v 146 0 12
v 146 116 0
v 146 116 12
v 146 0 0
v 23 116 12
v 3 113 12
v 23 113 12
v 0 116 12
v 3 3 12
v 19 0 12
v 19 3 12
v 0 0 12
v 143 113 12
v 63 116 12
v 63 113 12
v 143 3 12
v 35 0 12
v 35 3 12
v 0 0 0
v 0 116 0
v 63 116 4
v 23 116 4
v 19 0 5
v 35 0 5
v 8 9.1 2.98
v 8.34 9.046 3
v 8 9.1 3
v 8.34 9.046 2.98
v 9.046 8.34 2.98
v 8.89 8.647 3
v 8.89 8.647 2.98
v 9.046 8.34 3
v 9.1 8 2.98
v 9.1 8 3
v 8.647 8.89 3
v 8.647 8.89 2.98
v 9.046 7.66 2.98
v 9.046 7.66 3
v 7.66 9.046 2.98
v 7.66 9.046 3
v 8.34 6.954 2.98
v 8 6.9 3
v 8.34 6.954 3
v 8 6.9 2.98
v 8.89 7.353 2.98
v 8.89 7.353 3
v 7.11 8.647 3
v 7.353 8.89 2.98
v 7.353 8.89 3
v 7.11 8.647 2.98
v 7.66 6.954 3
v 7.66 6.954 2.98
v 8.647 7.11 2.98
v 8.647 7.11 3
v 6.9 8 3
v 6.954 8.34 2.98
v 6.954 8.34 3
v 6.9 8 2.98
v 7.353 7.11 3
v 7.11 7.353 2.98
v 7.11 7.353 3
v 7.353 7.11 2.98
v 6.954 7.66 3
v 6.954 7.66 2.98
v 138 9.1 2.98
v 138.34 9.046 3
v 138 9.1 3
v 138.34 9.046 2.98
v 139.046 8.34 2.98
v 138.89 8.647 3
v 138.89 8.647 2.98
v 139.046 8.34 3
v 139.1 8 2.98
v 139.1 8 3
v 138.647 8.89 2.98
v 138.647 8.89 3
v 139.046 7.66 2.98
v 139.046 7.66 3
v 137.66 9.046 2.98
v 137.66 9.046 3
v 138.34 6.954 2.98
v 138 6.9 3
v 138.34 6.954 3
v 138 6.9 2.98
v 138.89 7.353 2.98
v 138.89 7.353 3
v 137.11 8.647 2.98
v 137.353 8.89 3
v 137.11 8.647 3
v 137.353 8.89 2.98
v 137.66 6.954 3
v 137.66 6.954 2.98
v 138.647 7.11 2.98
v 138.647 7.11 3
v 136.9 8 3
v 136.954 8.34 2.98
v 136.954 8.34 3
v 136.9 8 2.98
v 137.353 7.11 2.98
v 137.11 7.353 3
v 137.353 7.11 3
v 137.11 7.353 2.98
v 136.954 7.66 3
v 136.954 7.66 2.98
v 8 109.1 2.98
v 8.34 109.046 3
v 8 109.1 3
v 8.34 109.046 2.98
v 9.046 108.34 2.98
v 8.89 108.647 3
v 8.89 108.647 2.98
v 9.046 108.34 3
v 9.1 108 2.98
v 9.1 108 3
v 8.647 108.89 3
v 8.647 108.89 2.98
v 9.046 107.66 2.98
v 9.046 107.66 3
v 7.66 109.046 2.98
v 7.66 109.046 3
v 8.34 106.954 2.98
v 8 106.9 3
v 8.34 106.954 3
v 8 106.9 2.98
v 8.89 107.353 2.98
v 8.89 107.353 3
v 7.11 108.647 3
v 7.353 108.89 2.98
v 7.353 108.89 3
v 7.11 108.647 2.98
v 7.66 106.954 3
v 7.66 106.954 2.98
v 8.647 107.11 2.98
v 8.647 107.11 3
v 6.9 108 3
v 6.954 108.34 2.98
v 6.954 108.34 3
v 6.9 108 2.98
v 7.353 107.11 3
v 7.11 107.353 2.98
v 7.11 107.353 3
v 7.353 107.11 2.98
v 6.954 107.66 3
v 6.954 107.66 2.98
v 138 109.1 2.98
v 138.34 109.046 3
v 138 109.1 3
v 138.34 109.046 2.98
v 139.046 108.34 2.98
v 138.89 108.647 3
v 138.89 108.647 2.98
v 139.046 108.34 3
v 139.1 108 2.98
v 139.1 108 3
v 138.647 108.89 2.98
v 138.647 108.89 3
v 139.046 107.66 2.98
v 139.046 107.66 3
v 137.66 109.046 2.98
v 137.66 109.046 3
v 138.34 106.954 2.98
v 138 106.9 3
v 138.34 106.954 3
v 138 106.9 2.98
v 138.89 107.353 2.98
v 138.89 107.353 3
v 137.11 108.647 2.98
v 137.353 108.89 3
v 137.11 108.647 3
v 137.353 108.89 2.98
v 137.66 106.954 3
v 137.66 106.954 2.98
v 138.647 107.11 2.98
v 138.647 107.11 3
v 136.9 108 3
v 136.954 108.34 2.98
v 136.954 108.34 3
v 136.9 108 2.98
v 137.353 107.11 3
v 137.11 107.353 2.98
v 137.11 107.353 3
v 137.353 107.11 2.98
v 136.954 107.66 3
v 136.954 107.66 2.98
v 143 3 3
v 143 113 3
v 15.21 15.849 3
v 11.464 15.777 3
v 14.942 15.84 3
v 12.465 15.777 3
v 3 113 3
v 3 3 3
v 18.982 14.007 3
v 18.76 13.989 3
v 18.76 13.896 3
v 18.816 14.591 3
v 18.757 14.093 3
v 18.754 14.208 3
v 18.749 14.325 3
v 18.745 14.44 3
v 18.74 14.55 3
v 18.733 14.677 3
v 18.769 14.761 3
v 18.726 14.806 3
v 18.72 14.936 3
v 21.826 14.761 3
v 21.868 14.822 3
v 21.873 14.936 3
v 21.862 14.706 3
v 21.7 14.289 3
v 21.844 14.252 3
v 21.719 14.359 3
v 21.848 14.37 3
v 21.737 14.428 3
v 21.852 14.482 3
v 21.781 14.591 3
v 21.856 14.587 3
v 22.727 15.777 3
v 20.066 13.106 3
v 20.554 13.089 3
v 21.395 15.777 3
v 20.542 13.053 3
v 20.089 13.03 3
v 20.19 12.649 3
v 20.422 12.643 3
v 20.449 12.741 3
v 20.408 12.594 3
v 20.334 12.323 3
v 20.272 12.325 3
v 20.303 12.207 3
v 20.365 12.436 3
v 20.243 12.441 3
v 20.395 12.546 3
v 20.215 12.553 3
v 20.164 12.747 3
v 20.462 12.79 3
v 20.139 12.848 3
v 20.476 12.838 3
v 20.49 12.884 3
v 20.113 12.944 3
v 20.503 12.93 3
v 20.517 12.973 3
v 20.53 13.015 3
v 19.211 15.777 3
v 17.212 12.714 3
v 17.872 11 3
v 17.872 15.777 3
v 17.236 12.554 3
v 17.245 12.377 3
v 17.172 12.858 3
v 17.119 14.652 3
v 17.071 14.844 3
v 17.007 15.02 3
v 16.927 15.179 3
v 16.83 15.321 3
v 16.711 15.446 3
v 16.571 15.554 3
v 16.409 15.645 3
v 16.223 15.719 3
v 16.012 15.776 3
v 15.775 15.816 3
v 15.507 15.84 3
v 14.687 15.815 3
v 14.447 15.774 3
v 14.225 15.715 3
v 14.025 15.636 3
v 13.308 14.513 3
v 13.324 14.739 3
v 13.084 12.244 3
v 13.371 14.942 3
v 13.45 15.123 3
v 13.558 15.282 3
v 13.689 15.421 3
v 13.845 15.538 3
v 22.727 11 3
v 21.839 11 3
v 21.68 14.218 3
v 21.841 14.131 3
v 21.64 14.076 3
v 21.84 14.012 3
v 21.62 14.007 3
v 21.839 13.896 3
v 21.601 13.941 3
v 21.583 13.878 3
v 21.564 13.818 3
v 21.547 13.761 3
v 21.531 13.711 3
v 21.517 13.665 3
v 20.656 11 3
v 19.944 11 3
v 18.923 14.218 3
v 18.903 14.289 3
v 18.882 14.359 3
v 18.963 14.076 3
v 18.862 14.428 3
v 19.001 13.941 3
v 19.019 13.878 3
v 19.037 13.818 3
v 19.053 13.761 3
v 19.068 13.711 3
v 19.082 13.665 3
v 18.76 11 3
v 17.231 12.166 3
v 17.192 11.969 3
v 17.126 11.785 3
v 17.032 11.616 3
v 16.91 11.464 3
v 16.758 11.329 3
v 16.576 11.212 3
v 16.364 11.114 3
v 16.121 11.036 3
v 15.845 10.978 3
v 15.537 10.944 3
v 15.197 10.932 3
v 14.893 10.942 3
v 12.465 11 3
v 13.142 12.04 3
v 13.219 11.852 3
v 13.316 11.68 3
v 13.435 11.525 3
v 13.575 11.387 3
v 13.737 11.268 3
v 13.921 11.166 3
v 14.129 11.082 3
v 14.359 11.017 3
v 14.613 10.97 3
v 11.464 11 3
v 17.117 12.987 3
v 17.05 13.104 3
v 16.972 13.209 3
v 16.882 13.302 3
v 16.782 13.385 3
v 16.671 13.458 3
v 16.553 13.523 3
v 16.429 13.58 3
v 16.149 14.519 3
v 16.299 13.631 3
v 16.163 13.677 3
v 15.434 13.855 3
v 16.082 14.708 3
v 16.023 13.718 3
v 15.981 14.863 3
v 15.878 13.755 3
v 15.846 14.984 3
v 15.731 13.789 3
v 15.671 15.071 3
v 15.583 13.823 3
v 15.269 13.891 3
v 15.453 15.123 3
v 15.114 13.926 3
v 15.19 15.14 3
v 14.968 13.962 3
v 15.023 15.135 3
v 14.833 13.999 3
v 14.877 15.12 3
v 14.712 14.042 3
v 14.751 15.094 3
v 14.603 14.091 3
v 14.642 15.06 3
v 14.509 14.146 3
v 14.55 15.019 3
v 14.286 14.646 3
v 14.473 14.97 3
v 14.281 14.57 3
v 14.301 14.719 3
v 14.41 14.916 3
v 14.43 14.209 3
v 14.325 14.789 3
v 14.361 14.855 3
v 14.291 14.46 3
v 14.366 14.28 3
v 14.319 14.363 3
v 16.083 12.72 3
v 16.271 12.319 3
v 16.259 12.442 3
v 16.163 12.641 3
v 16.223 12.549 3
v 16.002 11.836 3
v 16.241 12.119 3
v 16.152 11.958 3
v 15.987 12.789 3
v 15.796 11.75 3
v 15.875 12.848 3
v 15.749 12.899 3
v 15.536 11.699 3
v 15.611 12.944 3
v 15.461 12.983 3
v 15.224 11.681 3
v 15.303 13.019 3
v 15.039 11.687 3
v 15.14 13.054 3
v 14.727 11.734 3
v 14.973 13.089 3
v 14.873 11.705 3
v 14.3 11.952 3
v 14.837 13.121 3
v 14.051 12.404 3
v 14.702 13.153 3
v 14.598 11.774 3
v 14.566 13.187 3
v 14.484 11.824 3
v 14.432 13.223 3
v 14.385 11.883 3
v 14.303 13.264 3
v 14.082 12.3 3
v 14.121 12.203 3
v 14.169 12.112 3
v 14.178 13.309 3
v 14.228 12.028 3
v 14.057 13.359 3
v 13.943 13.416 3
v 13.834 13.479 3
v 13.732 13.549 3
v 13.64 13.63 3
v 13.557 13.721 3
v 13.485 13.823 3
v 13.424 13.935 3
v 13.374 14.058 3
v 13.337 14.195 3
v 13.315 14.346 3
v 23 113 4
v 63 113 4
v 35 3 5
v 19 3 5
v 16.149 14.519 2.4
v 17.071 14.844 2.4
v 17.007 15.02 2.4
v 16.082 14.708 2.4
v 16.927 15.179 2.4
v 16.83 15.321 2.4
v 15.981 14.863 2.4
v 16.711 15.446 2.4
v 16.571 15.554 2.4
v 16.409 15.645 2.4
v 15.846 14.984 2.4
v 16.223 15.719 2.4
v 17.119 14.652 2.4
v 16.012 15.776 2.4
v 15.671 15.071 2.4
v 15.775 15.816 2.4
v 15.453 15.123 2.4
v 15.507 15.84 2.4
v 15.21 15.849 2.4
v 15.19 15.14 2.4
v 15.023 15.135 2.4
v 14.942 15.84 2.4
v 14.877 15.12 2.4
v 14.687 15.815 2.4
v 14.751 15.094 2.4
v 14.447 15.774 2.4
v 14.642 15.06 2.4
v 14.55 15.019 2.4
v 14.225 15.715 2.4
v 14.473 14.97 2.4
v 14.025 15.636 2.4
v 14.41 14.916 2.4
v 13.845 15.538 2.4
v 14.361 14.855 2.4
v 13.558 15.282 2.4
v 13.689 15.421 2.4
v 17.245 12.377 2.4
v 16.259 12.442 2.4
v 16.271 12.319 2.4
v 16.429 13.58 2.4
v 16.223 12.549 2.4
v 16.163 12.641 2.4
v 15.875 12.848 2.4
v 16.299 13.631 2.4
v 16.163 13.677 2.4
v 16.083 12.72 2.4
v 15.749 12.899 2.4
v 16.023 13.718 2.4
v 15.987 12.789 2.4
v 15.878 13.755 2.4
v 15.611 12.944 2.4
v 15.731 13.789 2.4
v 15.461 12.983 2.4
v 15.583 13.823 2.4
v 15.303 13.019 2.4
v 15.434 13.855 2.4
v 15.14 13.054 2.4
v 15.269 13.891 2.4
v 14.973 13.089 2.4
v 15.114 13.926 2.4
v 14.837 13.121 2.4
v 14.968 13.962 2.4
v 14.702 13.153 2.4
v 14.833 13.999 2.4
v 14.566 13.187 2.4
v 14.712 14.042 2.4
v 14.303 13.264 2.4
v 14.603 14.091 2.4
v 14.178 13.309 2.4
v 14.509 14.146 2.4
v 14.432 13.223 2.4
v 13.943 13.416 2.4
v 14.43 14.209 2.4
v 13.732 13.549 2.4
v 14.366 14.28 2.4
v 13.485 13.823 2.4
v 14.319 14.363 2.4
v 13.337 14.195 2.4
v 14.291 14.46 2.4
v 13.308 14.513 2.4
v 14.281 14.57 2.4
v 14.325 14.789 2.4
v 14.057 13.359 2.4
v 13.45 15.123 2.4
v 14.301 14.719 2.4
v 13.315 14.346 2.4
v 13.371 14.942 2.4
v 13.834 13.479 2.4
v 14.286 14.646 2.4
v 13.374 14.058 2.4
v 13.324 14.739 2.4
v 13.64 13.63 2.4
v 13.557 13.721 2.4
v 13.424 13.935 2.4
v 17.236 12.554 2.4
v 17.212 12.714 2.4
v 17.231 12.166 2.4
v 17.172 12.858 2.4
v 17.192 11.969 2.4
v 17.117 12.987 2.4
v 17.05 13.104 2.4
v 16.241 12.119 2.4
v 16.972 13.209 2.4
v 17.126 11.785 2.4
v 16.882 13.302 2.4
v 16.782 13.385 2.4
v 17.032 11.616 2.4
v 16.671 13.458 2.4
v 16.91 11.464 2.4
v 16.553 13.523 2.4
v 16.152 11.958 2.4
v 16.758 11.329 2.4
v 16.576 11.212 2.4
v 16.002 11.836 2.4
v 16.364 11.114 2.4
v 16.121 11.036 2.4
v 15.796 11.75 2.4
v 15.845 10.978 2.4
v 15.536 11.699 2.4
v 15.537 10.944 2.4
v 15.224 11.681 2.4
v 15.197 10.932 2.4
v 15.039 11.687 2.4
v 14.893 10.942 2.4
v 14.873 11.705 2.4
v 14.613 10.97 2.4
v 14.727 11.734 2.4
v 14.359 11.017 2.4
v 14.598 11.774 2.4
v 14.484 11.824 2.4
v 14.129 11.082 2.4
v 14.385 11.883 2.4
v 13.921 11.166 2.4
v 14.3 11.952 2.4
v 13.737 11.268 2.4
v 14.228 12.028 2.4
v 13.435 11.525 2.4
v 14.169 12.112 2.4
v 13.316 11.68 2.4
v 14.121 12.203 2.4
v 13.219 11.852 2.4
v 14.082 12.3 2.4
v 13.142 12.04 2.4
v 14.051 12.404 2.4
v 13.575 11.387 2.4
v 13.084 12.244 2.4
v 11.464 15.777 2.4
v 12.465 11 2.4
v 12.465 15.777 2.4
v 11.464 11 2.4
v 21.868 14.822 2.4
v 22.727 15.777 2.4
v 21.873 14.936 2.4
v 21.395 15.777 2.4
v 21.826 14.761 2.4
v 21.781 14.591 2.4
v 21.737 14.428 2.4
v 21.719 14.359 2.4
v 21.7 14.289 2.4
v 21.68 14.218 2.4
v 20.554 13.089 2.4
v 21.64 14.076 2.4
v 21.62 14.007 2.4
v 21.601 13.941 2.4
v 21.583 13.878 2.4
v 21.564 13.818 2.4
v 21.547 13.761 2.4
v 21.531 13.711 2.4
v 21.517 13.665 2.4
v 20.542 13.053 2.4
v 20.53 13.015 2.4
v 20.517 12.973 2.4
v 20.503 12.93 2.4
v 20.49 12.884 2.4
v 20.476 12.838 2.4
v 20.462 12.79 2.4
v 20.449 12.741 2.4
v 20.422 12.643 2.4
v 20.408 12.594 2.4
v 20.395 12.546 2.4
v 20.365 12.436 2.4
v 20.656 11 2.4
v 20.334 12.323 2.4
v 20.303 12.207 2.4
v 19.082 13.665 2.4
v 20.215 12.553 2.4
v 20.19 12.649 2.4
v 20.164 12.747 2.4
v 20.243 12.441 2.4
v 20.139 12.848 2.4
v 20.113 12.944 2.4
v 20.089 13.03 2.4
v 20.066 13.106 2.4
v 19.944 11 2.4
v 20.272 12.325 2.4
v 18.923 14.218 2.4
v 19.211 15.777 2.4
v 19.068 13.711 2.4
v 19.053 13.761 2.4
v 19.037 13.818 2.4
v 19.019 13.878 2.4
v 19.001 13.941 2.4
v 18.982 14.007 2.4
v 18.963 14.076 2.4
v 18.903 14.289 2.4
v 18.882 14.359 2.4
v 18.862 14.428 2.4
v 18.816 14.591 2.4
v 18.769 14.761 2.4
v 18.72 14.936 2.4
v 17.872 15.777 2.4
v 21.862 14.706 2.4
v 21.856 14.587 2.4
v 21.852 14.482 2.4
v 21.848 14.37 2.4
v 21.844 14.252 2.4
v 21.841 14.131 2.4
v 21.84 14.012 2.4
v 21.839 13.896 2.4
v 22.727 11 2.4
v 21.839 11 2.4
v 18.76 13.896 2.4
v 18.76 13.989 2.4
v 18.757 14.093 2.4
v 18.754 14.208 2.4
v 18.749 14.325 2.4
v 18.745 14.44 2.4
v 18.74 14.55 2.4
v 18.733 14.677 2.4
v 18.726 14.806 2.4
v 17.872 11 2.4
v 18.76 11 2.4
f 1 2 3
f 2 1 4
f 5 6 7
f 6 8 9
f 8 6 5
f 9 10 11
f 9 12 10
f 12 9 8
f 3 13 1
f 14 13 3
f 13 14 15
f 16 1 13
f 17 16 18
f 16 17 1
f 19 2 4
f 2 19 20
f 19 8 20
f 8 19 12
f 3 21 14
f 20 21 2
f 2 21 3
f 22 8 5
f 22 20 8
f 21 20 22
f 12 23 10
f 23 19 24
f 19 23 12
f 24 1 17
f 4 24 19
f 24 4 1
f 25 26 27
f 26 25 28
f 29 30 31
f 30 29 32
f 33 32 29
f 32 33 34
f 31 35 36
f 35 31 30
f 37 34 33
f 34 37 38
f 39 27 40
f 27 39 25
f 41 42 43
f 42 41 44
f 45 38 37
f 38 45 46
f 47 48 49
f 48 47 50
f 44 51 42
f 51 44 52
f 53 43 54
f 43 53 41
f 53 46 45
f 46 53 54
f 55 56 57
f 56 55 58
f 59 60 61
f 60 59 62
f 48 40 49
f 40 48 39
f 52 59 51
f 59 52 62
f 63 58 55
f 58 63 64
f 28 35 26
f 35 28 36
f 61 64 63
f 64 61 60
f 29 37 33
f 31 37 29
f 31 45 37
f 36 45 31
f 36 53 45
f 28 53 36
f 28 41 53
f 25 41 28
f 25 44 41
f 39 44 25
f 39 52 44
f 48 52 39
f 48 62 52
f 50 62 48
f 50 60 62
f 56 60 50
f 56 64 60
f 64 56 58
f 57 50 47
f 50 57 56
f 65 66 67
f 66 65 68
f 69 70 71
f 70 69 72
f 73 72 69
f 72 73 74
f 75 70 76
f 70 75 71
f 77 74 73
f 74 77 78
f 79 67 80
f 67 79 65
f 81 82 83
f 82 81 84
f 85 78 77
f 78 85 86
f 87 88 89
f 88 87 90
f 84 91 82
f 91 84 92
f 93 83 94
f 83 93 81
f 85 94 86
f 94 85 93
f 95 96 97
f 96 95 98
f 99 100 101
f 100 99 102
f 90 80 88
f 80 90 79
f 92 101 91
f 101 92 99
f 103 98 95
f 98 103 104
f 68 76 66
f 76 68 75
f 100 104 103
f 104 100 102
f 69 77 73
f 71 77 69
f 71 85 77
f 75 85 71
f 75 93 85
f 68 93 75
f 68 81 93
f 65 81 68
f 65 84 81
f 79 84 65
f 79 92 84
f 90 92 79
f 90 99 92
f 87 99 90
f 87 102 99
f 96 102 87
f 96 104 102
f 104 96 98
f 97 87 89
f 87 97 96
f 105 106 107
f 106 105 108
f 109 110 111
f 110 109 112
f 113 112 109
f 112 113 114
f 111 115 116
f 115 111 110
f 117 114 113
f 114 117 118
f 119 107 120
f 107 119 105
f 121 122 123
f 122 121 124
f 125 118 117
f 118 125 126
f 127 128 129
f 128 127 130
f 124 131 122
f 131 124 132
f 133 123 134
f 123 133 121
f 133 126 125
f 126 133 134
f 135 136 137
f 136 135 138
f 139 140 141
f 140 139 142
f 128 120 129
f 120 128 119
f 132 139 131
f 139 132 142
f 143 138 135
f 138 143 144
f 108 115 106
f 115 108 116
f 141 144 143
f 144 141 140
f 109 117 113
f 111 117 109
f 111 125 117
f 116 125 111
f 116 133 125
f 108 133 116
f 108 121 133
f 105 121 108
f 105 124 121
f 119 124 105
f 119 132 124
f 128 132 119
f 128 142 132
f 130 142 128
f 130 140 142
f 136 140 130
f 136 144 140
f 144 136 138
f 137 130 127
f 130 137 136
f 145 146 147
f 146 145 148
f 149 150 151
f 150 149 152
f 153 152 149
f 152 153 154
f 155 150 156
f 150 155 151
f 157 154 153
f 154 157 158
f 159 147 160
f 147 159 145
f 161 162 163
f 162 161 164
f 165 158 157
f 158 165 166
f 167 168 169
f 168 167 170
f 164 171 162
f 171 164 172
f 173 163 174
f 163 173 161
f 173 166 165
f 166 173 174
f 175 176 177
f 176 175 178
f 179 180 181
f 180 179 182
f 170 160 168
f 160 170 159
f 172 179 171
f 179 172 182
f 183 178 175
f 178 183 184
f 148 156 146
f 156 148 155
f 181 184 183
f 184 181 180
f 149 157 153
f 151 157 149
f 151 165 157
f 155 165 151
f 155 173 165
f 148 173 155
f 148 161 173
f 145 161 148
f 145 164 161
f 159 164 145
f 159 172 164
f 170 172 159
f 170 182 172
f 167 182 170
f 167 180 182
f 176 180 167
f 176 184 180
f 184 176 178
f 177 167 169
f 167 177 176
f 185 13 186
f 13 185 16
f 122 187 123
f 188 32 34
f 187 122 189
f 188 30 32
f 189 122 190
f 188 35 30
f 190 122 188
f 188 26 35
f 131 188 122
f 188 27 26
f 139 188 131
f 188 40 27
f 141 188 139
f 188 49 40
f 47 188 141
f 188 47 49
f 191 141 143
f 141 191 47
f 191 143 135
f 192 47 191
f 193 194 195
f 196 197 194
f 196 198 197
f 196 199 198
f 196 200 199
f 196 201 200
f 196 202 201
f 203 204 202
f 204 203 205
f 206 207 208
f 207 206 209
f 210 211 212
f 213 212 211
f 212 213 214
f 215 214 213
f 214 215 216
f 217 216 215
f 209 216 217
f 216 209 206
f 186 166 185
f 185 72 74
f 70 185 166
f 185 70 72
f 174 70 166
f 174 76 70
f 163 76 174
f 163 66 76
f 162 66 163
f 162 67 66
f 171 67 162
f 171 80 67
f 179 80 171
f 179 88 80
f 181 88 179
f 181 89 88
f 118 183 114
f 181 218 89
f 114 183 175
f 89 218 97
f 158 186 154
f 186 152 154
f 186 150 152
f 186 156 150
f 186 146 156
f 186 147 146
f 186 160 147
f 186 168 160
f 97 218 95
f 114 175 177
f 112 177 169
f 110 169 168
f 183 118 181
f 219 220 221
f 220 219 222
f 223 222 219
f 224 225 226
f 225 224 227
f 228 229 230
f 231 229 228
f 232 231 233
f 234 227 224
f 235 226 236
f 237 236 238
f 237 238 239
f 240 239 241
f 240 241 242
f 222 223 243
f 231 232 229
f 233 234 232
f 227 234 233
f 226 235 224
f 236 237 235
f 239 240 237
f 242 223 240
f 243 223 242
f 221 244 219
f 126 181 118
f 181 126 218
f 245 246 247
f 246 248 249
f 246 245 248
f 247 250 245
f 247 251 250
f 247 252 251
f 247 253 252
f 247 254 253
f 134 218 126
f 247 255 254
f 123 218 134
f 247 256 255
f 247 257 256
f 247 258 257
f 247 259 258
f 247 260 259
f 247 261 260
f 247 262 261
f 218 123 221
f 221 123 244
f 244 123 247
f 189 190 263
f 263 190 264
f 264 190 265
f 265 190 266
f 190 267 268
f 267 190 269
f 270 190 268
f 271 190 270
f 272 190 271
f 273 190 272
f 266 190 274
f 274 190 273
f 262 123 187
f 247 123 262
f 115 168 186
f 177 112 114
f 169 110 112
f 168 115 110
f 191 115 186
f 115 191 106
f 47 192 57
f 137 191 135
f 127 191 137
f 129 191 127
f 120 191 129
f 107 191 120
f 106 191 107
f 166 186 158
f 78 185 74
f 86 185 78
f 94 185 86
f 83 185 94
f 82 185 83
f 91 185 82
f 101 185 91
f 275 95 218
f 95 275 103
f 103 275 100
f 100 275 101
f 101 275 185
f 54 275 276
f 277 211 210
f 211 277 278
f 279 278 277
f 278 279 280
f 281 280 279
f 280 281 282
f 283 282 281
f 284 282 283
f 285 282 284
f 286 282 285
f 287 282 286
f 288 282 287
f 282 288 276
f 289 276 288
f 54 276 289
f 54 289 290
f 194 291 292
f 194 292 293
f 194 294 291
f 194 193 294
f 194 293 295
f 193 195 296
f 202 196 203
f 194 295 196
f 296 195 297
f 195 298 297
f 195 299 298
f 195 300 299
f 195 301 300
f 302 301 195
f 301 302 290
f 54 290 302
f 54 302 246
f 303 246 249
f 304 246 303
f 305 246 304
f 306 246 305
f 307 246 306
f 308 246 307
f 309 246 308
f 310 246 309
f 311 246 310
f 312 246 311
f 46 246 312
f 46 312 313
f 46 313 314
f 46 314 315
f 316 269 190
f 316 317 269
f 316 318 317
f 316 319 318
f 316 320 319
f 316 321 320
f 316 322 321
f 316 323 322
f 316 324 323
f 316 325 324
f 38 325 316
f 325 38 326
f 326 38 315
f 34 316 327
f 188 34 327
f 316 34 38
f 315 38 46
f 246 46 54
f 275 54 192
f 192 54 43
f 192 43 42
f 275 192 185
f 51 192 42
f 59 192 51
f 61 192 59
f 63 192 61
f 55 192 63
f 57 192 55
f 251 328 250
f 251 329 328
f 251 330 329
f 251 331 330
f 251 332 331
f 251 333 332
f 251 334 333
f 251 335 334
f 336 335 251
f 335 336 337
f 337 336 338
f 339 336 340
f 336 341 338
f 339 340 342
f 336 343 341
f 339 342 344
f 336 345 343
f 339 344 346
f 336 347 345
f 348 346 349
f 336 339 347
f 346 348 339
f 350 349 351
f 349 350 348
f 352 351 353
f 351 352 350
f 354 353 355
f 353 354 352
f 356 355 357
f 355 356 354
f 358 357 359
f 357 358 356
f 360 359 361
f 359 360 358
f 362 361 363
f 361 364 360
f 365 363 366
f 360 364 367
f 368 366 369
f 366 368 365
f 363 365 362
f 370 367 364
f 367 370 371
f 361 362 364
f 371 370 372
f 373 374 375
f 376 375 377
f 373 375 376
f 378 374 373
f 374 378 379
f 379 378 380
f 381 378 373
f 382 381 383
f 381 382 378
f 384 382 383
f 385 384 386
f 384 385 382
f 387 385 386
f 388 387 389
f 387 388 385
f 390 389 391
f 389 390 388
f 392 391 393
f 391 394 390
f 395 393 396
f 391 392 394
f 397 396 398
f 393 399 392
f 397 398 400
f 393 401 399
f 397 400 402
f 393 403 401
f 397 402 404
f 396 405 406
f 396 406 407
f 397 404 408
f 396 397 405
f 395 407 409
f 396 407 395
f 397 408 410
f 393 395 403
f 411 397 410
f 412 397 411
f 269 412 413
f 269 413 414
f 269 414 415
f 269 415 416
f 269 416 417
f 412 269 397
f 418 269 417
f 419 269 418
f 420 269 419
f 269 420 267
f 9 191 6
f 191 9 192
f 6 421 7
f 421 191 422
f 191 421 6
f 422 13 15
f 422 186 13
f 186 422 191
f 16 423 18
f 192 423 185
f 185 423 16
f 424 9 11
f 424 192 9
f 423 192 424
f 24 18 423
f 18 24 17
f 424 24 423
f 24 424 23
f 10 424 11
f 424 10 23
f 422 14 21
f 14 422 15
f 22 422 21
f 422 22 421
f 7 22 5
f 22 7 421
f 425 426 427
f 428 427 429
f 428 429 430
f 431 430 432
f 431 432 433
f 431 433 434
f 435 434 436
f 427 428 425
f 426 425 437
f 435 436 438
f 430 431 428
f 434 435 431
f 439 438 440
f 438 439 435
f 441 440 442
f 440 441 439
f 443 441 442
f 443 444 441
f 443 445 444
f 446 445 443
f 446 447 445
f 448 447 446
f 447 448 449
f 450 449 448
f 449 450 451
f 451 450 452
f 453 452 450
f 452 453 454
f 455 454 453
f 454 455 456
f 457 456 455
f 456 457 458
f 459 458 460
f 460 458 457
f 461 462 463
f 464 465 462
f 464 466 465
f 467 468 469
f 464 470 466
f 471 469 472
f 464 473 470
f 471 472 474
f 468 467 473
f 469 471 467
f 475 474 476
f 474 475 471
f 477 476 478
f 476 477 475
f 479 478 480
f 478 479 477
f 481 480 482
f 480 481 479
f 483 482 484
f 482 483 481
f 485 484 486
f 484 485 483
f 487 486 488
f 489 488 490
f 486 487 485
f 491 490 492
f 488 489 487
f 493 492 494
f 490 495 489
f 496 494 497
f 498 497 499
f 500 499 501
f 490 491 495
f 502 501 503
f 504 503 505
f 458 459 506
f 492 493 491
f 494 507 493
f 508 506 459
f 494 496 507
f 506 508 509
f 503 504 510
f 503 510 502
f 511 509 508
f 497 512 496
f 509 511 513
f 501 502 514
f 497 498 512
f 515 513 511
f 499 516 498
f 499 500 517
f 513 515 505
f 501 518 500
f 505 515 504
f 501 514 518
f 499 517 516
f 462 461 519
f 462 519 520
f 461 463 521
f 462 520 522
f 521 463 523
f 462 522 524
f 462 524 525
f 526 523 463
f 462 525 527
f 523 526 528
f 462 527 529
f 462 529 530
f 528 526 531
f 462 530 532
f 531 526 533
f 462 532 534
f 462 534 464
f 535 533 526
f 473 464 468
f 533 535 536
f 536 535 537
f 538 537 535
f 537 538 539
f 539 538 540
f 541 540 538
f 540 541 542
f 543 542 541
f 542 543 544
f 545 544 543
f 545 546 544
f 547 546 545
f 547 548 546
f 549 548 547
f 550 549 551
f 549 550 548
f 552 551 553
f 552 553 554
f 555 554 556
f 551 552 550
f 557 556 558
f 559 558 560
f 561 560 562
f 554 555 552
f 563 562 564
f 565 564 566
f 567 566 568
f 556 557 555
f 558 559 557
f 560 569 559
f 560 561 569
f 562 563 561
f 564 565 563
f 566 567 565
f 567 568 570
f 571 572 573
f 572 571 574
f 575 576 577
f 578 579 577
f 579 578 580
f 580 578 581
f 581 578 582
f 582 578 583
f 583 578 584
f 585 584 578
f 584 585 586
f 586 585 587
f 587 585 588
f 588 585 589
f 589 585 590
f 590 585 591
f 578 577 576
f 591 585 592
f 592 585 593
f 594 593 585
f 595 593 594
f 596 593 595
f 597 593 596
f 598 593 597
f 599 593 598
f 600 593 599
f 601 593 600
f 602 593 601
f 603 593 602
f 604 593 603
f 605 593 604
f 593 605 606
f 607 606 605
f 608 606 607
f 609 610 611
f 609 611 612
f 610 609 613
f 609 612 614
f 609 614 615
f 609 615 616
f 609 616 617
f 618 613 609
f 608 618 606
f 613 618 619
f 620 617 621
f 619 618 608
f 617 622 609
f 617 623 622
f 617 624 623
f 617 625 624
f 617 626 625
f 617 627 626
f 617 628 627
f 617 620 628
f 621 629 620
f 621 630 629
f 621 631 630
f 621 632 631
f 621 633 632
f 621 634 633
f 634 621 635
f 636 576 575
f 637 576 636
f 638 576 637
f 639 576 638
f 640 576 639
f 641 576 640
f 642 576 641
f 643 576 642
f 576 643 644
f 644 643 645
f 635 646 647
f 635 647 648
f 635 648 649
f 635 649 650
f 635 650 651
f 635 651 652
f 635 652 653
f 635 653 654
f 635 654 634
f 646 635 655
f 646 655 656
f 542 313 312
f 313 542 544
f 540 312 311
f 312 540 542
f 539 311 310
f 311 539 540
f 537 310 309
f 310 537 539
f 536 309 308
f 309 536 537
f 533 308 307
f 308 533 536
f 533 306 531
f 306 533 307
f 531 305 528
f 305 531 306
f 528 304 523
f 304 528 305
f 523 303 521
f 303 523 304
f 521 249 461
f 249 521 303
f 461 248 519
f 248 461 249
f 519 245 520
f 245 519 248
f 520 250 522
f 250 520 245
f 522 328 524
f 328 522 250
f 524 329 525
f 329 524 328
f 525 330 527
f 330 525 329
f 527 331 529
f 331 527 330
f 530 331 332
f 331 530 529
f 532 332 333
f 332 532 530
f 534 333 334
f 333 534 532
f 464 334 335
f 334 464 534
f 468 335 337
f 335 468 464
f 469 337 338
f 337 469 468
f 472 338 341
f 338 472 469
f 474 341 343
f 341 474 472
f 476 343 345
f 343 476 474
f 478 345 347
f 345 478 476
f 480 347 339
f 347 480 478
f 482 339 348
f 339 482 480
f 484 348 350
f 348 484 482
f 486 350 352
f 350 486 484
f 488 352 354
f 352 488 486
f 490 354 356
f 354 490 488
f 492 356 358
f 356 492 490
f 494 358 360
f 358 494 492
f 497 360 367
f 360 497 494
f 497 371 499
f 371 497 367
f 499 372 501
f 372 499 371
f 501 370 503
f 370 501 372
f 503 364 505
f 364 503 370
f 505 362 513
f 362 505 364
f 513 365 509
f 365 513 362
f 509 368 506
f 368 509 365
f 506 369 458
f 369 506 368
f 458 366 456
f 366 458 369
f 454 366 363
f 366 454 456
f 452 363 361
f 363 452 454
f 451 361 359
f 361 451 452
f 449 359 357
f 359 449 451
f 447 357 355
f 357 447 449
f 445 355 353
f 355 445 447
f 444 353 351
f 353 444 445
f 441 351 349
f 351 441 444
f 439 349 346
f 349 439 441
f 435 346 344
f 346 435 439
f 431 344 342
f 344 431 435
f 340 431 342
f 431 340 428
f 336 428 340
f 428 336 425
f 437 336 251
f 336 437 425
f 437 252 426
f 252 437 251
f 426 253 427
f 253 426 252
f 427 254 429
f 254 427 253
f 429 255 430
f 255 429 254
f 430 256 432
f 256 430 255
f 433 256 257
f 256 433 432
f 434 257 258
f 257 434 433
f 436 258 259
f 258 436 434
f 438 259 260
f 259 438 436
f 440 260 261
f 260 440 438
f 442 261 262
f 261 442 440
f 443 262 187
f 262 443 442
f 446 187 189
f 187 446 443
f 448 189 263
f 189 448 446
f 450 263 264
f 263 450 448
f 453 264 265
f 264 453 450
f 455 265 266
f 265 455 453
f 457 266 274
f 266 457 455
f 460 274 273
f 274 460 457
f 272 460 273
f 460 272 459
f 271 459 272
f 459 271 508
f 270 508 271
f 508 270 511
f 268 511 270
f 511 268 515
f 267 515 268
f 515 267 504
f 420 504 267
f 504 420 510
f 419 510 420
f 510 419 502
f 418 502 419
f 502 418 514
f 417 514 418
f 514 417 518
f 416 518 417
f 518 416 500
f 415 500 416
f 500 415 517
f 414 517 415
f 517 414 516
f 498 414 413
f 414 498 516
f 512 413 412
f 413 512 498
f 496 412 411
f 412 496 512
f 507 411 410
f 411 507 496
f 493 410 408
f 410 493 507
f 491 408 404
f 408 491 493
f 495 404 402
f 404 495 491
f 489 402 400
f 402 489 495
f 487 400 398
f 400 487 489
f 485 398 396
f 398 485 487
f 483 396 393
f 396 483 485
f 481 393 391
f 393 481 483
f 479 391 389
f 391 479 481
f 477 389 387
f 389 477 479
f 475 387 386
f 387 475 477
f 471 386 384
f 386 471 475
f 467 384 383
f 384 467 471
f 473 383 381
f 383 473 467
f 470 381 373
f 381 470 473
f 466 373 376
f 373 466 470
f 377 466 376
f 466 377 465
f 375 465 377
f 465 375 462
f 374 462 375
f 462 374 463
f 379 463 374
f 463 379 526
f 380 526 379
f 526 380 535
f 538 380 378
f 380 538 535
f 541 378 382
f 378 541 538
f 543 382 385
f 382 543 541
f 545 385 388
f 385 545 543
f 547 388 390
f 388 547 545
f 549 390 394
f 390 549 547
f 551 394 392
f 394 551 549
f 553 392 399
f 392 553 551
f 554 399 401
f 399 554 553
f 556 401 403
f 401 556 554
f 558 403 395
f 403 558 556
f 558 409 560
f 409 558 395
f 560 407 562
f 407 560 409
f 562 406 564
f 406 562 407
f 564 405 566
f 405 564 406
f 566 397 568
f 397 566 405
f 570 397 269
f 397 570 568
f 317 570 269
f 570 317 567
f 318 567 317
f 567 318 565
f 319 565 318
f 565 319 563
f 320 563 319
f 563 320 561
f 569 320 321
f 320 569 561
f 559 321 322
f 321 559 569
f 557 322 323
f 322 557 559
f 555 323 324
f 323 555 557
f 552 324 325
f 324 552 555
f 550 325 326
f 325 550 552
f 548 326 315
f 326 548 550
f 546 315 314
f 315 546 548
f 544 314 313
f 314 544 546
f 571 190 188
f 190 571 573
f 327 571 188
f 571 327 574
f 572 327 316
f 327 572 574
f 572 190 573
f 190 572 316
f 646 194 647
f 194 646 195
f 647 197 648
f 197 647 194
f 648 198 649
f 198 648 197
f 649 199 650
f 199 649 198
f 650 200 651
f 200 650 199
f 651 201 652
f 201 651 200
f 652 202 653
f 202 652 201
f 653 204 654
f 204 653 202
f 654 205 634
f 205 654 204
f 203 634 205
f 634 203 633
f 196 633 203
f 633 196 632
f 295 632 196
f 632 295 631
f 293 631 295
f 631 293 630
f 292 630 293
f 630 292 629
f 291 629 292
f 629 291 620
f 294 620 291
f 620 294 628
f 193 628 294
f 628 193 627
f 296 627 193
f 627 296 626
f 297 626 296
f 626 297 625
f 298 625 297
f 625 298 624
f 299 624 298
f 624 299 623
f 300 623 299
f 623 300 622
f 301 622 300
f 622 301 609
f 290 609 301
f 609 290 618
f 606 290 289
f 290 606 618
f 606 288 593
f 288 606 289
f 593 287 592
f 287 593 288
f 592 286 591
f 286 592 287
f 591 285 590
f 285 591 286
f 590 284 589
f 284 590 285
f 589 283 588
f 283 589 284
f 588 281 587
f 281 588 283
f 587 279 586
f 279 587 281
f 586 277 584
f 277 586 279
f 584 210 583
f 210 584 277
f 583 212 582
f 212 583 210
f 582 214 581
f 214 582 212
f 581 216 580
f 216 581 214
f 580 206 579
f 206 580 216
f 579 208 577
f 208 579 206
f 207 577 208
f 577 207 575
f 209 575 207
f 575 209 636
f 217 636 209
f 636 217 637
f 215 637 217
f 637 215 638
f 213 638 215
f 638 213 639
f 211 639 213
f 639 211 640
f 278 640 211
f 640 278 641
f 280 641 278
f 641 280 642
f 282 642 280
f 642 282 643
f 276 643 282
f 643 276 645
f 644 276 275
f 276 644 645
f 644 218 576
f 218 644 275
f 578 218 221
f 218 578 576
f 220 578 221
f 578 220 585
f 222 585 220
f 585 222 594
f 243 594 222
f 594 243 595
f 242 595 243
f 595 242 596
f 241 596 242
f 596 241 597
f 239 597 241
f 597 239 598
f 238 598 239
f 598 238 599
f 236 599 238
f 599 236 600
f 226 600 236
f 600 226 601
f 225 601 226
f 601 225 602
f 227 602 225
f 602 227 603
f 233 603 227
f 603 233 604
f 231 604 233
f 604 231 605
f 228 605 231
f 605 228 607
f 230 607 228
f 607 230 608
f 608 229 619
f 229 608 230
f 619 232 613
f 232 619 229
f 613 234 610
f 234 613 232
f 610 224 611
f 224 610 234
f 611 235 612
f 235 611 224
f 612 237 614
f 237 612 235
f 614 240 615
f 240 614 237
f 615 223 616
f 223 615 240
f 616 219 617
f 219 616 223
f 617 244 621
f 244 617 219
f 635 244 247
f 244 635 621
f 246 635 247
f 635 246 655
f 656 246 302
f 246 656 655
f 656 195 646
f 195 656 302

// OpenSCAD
// ISM Motherboard tray + I/O shield (original ISM)
// Manifold-safe: bosses unioned into shell, holes cut in one difference().
pcb_w = 140;
pcb_d = 110;
wall = 3;
lip = 2;
tray_h = 12;
eps = 0.02;
mount_d = 2.2;
badge_depth = 0.6;

mounts = [[5, 5], [pcb_w - 5, 5], [5, pcb_d - 5], [pcb_w - 5, pcb_d - 5]];

module tray() {
  difference() {
    union() {
      cube([pcb_w + 2 * wall, pcb_d + 2 * wall, tray_h]);
      for (p = mounts)
        translate([p[0] + wall, p[1] + wall, wall - eps])
          cylinder(h = 6 + eps, d = 6, $fn = 24);
    }
    translate([wall, wall, wall])
      cube([pcb_w, pcb_d, tray_h - wall + eps]);
    // USB-C cutout (front)
    translate([wall + 16, -eps, wall + 2])
      cube([16, wall + 2 * eps, 8]);
    // Header clearance windows
    translate([wall + 20, wall + pcb_d - 2, wall + 1])
      cube([40, wall + 4, 8]);
    for (p = mounts)
      translate([p[0] + wall, p[1] + wall, wall - eps])
        cylinder(h = 8 + 2 * eps, d = mount_d, $fn = 20);
    translate([wall + 8, wall + 8, wall - badge_depth])
      linear_extrude(height = badge_depth + eps)
        text("ISM", size = 5, font = "Liberation Sans:style=Bold");
  }
}

module io_shield() {
  w = pcb_w + 2 * wall;
  h = 28;
  t = wall;
  difference() {
    cube([w, t, h]);
    translate([wall + 16, -eps, 8])
      cube([16, t + 2 * eps, 8]);
    translate([wall + 100, -eps, 6])
      cube([20, t + 2 * eps, 14]);
  }
}

module lid() {
  difference() {
    cube([pcb_w + 2 * wall, pcb_d + 2 * wall, wall]);
    for (p = mounts)
      translate([p[0] + wall, p[1] + wall, -eps])
        cylinder(h = wall + 2 * eps, d = mount_d, $fn = 20);
    translate([(pcb_w + 2 * wall) / 2 - 30, (pcb_d + 2 * wall) / 2 - 6, wall - 1])
      cube([60, 12, 1.2]);
  }
}

tray();
